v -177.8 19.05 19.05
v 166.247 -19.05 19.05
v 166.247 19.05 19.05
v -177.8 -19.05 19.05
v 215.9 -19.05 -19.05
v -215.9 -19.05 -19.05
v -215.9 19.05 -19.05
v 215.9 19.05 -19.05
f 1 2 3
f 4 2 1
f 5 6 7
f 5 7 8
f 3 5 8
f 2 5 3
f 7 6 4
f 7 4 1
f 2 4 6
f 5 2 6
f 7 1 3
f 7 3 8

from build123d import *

# Parameters (mm, degrees)
F1_DEPTH = 19.05
F2_SIZE  = 38.09999


# Not quite as in the source:
# - a fillet or chamfer is up to 0.001 mm smaller than in the source, because OpenCascade refuses the exact size


with BuildPart() as f1:
    # F0 (on Front) → F1 (new body, symmetric)
    with BuildSketch(Plane.XZ):
        Polygon((-215.9, 19.05), (-215.9, -19.05), (215.9, -19.05), (166.2471132948, 19.05), align=None)
    extrude(amount=F1_DEPTH, both=True)

    # F2 (size 38.1 in the source; OpenCascade refuses exactly that, so slightly less here)
    f2_edges = [f1.edges().sort_by_distance(p)[0] for p in [
        (-215.9, 0, 19.05),
    ]]
    chamfer(f2_edges, length=F2_SIZE)


solid = f1.part
